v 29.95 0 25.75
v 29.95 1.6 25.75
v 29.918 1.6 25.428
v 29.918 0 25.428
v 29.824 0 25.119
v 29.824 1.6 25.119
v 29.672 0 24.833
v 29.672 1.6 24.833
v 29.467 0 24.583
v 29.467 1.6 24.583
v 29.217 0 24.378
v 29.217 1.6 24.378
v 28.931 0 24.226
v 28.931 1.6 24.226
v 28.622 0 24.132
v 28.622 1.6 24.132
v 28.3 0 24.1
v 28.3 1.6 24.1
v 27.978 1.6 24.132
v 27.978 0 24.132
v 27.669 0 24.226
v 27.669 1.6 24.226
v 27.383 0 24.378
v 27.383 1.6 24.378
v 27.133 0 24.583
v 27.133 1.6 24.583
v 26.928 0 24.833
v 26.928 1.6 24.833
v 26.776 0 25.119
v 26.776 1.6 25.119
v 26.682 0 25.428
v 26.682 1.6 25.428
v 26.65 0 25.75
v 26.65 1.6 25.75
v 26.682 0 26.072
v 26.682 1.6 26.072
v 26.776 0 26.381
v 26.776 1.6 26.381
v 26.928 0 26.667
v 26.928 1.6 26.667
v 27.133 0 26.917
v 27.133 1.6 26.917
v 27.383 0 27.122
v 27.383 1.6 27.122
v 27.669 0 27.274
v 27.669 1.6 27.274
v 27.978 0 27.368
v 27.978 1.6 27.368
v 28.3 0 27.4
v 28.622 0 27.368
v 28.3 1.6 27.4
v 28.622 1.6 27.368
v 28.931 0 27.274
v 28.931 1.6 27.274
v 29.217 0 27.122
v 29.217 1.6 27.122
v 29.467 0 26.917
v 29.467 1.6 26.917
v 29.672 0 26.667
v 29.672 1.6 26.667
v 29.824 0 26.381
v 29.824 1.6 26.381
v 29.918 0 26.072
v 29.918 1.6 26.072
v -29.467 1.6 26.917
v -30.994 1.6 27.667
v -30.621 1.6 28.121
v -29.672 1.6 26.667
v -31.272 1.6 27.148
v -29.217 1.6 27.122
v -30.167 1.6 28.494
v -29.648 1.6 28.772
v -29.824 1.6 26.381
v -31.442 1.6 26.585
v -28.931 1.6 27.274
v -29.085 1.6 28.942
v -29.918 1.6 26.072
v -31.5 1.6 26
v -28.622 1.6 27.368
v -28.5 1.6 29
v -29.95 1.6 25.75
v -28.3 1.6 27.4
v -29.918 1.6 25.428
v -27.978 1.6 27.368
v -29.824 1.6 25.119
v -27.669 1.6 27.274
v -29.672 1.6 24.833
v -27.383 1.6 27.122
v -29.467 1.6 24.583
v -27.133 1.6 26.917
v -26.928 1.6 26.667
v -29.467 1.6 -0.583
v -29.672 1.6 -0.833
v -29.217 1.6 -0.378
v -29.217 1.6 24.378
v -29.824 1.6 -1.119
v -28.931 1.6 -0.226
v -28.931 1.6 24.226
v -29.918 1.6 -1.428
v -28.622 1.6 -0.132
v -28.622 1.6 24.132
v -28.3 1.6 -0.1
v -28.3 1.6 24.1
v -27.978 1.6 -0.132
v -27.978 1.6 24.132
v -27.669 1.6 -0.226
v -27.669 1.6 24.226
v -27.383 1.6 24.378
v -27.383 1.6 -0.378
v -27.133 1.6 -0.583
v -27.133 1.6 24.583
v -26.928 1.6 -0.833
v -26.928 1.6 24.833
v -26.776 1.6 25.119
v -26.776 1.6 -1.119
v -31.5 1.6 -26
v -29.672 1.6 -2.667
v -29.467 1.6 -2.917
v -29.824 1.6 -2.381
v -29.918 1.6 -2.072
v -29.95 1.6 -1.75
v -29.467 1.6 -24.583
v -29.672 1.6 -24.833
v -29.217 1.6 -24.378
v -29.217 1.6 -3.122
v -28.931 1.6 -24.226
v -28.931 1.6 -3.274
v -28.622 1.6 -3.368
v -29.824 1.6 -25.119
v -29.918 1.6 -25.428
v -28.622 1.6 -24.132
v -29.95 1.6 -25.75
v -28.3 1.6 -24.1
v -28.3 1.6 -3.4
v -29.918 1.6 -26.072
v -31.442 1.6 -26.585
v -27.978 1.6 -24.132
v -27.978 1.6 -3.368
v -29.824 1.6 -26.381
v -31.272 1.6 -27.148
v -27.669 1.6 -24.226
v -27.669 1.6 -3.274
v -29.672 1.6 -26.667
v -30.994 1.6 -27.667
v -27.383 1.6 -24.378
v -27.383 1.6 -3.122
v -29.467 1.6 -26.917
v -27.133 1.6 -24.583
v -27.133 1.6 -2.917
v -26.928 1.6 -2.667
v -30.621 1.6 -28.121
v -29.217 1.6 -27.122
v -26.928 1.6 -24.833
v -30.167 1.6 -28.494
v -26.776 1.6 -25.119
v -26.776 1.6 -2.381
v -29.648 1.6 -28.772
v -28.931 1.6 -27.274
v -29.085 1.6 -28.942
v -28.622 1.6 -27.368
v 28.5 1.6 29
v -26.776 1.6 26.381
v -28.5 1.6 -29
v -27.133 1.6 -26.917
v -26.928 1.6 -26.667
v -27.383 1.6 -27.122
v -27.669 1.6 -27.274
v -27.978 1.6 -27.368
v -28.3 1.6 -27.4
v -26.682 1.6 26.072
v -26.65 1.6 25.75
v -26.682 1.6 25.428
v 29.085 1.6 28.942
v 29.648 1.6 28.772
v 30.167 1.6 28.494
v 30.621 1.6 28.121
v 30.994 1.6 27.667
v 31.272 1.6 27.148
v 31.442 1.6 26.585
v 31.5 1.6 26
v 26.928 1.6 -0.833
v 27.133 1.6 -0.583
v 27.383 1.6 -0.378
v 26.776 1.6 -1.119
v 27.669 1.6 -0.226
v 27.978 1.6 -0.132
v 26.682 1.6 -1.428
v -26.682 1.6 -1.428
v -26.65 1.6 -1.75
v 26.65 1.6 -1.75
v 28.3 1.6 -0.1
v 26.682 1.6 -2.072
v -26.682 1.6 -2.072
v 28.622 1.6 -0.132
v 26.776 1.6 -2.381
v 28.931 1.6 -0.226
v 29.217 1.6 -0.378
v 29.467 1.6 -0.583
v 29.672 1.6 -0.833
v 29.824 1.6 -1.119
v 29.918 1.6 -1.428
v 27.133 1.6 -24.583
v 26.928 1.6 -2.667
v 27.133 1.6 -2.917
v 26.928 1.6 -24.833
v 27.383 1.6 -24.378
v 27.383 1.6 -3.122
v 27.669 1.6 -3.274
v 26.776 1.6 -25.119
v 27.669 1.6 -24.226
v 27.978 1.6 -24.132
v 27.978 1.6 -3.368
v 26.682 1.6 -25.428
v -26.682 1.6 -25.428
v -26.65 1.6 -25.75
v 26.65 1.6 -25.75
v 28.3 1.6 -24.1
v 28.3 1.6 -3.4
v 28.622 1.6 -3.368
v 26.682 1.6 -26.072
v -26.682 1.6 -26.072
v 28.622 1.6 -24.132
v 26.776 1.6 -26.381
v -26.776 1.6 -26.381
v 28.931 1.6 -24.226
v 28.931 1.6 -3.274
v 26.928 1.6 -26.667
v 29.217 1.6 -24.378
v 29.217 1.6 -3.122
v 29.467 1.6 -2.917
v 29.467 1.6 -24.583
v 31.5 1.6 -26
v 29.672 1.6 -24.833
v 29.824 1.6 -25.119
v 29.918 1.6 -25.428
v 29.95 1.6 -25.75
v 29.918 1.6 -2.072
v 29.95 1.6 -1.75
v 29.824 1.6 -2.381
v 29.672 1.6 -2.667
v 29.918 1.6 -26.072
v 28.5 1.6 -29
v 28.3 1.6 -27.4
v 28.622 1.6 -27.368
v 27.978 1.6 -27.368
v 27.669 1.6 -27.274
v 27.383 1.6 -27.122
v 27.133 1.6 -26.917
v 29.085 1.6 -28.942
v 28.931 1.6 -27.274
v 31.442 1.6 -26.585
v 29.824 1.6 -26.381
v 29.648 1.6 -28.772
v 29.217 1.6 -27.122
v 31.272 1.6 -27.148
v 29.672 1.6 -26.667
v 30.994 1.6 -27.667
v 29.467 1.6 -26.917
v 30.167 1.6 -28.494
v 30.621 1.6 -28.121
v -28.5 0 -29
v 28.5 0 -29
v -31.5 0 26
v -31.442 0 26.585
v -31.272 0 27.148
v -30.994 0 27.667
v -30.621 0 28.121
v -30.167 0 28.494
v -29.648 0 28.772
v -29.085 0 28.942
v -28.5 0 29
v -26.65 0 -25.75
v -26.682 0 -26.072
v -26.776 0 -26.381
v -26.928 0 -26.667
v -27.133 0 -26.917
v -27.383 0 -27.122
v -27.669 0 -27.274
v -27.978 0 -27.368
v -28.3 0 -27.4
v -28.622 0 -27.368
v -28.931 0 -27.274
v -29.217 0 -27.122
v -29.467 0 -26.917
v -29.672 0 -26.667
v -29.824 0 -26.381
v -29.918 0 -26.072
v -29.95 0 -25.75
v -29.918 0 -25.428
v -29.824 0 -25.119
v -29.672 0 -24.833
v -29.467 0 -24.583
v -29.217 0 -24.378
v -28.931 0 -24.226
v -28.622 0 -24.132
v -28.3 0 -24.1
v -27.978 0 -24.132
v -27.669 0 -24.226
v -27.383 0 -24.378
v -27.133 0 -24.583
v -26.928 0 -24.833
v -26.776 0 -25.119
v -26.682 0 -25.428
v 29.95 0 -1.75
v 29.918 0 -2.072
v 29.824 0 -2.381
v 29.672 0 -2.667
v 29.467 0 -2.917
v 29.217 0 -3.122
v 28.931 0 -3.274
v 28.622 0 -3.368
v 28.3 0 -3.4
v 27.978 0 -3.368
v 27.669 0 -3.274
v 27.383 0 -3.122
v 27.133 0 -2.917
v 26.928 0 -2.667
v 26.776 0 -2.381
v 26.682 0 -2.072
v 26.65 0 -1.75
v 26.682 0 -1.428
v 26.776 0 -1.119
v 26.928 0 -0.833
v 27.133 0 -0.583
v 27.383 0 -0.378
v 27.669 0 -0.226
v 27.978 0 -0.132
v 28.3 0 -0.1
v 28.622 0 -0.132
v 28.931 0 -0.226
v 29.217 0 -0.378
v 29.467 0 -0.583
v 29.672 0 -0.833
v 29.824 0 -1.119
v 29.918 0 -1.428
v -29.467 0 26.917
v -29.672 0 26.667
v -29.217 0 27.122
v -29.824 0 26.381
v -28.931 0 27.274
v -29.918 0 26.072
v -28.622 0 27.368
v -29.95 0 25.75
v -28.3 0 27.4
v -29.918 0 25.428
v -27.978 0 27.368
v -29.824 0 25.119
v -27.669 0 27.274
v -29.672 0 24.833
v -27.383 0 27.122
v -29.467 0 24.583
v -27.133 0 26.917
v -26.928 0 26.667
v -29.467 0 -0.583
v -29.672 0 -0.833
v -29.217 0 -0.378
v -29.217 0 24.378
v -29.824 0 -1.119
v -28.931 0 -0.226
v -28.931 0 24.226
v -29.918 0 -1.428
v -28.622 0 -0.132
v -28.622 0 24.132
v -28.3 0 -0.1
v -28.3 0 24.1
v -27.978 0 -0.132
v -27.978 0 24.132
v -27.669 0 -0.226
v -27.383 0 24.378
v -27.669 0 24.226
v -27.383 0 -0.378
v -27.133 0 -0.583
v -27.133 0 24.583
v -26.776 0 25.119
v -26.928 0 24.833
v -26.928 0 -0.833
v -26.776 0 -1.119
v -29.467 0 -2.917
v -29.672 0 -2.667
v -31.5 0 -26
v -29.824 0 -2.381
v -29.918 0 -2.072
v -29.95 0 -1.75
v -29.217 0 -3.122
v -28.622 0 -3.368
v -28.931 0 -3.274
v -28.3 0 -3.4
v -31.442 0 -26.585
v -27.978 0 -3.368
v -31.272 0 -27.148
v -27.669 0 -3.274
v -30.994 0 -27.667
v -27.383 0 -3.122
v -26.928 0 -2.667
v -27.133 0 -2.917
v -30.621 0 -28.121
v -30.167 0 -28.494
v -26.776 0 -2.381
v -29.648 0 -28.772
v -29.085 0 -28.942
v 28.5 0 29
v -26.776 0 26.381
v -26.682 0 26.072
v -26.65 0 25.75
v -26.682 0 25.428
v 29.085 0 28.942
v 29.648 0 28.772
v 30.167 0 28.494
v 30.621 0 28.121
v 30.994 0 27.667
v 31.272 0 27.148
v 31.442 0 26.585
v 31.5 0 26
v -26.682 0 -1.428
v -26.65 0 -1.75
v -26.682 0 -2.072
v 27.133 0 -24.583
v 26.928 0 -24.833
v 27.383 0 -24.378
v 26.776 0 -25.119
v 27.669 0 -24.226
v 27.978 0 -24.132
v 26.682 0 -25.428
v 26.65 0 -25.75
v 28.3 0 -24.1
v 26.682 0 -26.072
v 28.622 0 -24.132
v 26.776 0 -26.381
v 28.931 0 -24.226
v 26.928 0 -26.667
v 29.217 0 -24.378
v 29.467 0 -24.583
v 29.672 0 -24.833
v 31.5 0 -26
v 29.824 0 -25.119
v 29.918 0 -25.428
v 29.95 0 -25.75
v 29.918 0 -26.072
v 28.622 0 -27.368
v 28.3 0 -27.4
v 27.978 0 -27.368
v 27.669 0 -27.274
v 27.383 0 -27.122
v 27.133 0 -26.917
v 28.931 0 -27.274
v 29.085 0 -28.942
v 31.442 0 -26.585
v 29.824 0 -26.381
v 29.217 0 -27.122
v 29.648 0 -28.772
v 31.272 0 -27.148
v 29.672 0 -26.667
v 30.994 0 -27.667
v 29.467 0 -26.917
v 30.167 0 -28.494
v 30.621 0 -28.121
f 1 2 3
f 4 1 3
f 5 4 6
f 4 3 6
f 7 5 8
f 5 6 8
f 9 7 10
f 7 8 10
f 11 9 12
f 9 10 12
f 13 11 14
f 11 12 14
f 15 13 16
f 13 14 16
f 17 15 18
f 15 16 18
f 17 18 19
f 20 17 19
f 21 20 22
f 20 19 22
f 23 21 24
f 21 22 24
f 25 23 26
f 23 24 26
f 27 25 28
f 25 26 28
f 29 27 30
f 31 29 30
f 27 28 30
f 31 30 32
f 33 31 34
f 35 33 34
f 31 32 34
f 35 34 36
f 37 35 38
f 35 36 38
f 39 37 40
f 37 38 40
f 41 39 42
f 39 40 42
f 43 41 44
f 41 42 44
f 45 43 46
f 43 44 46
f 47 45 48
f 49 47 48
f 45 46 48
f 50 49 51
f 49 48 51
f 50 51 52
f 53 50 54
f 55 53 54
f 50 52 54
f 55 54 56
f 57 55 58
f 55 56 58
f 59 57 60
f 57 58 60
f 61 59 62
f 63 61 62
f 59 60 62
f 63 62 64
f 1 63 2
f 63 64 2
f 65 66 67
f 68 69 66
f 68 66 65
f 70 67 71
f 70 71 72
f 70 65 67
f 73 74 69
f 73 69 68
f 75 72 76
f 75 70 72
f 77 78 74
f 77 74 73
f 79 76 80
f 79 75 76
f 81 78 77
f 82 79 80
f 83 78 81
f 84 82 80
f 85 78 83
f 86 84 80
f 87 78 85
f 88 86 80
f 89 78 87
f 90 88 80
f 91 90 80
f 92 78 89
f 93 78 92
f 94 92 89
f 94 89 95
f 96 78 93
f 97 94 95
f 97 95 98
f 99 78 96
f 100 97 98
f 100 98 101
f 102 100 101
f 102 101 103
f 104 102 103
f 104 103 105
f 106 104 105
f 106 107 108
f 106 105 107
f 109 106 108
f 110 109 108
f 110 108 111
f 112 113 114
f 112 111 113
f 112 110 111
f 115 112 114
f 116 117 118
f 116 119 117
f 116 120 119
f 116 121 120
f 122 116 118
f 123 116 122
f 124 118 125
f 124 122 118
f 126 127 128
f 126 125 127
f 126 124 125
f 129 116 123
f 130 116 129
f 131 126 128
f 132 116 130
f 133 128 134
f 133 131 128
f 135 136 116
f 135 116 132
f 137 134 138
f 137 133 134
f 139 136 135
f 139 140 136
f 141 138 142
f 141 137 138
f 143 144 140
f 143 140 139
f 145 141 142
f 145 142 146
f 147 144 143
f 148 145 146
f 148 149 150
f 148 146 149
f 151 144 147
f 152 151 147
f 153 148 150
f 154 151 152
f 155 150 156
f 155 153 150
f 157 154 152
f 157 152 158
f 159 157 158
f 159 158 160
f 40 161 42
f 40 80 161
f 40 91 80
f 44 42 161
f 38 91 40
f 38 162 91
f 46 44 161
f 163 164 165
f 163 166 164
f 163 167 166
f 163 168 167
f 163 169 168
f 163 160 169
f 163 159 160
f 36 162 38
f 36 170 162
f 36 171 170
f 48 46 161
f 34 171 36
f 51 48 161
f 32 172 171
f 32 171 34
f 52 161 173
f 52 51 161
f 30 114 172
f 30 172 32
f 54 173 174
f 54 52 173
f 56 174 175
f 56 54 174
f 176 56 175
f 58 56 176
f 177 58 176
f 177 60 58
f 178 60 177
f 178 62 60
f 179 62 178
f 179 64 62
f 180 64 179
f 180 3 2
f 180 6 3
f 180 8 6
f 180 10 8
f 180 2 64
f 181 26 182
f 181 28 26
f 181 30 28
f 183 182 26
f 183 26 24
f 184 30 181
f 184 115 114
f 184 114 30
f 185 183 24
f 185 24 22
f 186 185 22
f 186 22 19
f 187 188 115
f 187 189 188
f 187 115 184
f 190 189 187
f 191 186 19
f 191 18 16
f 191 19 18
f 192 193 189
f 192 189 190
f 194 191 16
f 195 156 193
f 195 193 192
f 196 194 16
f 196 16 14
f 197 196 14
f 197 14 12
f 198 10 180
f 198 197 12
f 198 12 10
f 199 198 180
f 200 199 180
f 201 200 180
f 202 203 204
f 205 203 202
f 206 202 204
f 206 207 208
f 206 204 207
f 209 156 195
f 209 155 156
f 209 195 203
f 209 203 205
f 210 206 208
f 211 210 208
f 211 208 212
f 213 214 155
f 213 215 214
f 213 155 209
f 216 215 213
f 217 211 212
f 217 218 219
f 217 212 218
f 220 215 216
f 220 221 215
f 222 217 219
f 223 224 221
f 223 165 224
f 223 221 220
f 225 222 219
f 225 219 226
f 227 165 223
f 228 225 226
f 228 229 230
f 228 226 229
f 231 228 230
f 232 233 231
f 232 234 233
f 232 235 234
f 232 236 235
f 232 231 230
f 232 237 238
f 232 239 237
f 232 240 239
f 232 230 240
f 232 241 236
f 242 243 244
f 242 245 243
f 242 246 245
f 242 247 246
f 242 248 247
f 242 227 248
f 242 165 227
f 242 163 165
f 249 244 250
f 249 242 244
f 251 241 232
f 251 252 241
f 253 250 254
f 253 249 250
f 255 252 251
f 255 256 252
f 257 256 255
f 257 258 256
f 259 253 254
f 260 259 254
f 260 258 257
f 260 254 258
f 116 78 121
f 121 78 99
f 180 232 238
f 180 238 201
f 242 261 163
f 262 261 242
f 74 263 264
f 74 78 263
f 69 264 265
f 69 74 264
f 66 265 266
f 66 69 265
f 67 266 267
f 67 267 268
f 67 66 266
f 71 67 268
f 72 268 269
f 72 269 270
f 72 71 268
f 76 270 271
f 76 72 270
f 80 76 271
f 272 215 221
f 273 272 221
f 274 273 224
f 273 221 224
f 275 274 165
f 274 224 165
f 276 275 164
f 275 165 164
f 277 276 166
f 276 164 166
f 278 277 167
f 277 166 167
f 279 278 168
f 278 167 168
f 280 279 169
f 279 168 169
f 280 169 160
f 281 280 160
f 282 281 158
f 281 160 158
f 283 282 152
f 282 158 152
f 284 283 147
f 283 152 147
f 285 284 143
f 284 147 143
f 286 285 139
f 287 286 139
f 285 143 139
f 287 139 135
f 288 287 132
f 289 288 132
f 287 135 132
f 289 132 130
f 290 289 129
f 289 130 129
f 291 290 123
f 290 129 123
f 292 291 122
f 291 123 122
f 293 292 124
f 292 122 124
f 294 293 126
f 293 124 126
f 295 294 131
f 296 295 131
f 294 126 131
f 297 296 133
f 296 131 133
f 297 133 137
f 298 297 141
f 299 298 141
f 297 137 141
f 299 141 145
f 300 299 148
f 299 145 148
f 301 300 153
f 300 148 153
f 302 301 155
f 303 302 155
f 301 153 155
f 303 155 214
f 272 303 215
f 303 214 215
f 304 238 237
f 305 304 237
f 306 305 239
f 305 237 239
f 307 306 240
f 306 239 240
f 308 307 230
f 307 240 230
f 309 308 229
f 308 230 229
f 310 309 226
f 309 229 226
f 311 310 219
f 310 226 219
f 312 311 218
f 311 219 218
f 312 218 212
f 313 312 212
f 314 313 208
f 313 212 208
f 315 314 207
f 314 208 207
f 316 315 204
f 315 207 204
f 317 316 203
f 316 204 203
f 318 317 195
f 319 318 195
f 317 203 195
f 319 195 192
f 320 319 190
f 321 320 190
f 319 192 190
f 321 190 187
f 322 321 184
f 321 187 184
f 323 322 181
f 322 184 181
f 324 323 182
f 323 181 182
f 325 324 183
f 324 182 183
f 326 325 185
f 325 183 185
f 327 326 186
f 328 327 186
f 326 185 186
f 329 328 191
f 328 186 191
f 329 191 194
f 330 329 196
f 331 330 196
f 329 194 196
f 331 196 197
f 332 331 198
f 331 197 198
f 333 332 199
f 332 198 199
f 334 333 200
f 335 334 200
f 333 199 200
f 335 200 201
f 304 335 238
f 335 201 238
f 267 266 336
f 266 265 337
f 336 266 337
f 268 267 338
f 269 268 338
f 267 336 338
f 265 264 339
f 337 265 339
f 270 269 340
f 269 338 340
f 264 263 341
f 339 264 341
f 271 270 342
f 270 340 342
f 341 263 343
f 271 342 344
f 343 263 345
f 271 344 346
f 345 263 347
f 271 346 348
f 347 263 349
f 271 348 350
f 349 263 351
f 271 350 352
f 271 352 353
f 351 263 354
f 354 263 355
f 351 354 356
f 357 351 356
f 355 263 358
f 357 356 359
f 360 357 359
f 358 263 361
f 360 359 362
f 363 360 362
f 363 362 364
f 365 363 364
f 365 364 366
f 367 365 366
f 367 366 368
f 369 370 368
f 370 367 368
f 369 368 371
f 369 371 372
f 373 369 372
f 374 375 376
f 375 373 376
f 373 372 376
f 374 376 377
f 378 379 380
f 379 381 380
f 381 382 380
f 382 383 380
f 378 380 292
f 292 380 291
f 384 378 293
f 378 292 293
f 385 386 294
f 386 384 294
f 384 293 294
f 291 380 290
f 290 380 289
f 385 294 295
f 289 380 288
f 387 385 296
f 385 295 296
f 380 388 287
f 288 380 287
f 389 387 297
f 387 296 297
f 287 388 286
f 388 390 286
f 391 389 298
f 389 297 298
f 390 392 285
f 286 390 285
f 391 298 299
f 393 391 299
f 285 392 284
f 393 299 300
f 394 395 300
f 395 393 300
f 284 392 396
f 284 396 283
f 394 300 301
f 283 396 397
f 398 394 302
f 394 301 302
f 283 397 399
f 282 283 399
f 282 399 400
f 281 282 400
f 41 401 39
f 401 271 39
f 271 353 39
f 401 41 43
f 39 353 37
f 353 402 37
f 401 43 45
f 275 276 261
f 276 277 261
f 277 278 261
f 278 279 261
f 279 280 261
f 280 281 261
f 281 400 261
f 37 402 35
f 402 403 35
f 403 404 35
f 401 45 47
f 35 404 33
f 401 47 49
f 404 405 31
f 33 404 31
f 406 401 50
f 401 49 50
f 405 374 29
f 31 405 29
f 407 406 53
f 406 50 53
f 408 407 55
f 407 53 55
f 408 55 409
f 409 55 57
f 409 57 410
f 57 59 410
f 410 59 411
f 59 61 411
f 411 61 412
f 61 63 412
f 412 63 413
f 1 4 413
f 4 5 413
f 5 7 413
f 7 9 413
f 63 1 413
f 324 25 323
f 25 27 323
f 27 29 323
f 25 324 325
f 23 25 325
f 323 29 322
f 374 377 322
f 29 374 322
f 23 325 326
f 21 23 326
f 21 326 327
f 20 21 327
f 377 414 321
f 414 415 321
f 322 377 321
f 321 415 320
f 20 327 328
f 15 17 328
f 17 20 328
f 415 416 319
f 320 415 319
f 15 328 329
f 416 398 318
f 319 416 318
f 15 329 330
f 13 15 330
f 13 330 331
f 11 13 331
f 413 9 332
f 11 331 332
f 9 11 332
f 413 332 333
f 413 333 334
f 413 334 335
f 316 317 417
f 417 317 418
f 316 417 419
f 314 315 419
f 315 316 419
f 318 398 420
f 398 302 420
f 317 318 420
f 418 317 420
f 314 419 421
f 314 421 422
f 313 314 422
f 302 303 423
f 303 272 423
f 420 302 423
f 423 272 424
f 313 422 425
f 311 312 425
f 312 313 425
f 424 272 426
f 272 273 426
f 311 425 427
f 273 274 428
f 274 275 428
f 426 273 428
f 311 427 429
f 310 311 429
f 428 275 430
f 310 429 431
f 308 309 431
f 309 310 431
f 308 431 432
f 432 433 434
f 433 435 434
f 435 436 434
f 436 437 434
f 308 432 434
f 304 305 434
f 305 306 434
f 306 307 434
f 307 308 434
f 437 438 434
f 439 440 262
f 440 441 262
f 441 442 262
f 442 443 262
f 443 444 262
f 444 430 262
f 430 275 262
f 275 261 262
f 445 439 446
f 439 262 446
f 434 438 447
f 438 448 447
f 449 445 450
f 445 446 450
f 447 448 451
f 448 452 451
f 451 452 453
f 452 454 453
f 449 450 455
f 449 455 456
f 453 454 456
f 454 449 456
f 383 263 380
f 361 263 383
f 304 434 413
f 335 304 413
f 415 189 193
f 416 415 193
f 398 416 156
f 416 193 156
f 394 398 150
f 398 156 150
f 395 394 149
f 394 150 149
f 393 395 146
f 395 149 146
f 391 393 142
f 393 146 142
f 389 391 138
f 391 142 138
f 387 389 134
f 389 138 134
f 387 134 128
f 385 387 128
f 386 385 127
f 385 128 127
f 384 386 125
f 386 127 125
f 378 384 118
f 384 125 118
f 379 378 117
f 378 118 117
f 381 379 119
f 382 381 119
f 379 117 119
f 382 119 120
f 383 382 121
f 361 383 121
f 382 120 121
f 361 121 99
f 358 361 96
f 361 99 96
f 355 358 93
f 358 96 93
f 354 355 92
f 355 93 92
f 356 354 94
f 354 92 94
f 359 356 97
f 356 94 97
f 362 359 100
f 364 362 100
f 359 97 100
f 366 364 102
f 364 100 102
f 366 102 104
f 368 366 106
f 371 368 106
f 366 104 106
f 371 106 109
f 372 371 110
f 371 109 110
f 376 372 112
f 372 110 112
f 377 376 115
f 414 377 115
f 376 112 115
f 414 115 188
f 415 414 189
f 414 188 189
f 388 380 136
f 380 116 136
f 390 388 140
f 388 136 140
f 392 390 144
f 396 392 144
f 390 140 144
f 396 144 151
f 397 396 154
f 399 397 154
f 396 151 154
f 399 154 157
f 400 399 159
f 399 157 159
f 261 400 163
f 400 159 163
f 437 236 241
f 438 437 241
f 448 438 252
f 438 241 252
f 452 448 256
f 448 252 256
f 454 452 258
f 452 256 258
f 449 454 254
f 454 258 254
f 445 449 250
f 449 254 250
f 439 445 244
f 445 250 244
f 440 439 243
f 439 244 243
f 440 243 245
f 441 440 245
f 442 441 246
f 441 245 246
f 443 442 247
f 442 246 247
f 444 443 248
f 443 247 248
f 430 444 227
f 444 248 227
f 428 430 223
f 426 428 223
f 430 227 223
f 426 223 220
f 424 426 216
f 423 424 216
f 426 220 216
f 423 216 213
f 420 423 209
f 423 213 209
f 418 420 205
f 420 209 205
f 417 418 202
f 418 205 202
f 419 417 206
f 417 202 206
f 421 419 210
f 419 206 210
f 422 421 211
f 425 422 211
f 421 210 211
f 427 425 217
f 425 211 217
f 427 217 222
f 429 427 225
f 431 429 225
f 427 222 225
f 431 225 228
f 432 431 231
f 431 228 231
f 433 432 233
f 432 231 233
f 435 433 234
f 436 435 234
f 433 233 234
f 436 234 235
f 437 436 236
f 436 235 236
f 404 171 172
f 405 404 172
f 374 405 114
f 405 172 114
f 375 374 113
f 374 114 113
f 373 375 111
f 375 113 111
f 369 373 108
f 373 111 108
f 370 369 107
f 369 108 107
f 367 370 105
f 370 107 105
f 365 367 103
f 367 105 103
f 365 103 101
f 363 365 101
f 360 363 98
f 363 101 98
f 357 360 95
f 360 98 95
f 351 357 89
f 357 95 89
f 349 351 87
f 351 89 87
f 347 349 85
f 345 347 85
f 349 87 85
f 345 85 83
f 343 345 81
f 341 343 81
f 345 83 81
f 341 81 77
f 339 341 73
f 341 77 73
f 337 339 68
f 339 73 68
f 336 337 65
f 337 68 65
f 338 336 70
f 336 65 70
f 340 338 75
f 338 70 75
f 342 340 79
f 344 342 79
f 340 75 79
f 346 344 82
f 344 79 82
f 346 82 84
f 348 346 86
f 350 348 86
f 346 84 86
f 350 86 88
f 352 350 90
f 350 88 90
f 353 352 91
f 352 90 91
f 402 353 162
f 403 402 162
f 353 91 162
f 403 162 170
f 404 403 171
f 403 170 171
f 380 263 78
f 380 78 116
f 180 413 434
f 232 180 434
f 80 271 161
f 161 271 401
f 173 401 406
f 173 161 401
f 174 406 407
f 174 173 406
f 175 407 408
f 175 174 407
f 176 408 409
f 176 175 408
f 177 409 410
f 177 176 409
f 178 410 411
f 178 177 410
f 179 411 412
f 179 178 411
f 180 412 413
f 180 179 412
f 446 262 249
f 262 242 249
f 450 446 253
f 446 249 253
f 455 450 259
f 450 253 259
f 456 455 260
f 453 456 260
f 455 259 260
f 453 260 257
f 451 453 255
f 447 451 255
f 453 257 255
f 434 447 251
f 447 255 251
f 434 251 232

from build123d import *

# Parameters (mm, degrees)
SKETCH_1_W          = 63
SKETCH_1_H          = 58
EXTRUDE_1_DEPTH     = 1.6
SKETCH_2_R          = 1.65
CUT_EXTRUDE_1_DEPTH = 1.6
FILLET_1_R          = 3
SKETCH_3_R          = 1.65
CUT_EXTRUDE_2_DEPTH = 1.6


with BuildPart() as part:
    # 草图1 → 凸台-拉伸1 (new body)
    with BuildSketch(Plane(origin=(0, 0, 0), x_dir=(1, 0, 0), z_dir=(0, 1, 0))):
        Rectangle(SKETCH_1_W, SKETCH_1_H)
    extrude(amount=EXTRUDE_1_DEPTH)

    # 草图2 → 切除-拉伸1 (cut)
    with BuildSketch(Plane(origin=(0, 1.6, 0), x_dir=(1, 0, 0), z_dir=(0, 1, 0))):
        with Locations((-28.3, 25.75)):
            Circle(SKETCH_2_R)
        with Locations((28.3, 25.75)):
            Circle(SKETCH_2_R)
        with Locations((28.3, -25.75)):
            Circle(SKETCH_2_R)
        with Locations((-28.3, -25.75)):
            Circle(SKETCH_2_R)
    extrude(amount=-CUT_EXTRUDE_1_DEPTH, mode=Mode.SUBTRACT)

    # 圆角1
    fillet_1_edges = [part.edges().sort_by_distance(p)[0] for p in [
        (31.5, 0.8, 29),
        (-31.5, 0.8, 29),
        (-31.5, 0.8, -29),
        (31.5, 0.8, -29),
    ]]
    fillet(fillet_1_edges, radius=FILLET_1_R)

    # 草图3 → 切除-拉伸2 (cut)
    with BuildSketch(Plane(origin=(0, 1.6, 0), x_dir=(1, 0, 0), z_dir=(0, 1, 0))):
        with Locations((-28.3, 1.75)):
            Circle(SKETCH_3_R)
        with Locations((28.3, 1.75)):
            Circle(SKETCH_3_R)
    extrude(amount=-CUT_EXTRUDE_2_DEPTH, mode=Mode.SUBTRACT)


solid = part.part
